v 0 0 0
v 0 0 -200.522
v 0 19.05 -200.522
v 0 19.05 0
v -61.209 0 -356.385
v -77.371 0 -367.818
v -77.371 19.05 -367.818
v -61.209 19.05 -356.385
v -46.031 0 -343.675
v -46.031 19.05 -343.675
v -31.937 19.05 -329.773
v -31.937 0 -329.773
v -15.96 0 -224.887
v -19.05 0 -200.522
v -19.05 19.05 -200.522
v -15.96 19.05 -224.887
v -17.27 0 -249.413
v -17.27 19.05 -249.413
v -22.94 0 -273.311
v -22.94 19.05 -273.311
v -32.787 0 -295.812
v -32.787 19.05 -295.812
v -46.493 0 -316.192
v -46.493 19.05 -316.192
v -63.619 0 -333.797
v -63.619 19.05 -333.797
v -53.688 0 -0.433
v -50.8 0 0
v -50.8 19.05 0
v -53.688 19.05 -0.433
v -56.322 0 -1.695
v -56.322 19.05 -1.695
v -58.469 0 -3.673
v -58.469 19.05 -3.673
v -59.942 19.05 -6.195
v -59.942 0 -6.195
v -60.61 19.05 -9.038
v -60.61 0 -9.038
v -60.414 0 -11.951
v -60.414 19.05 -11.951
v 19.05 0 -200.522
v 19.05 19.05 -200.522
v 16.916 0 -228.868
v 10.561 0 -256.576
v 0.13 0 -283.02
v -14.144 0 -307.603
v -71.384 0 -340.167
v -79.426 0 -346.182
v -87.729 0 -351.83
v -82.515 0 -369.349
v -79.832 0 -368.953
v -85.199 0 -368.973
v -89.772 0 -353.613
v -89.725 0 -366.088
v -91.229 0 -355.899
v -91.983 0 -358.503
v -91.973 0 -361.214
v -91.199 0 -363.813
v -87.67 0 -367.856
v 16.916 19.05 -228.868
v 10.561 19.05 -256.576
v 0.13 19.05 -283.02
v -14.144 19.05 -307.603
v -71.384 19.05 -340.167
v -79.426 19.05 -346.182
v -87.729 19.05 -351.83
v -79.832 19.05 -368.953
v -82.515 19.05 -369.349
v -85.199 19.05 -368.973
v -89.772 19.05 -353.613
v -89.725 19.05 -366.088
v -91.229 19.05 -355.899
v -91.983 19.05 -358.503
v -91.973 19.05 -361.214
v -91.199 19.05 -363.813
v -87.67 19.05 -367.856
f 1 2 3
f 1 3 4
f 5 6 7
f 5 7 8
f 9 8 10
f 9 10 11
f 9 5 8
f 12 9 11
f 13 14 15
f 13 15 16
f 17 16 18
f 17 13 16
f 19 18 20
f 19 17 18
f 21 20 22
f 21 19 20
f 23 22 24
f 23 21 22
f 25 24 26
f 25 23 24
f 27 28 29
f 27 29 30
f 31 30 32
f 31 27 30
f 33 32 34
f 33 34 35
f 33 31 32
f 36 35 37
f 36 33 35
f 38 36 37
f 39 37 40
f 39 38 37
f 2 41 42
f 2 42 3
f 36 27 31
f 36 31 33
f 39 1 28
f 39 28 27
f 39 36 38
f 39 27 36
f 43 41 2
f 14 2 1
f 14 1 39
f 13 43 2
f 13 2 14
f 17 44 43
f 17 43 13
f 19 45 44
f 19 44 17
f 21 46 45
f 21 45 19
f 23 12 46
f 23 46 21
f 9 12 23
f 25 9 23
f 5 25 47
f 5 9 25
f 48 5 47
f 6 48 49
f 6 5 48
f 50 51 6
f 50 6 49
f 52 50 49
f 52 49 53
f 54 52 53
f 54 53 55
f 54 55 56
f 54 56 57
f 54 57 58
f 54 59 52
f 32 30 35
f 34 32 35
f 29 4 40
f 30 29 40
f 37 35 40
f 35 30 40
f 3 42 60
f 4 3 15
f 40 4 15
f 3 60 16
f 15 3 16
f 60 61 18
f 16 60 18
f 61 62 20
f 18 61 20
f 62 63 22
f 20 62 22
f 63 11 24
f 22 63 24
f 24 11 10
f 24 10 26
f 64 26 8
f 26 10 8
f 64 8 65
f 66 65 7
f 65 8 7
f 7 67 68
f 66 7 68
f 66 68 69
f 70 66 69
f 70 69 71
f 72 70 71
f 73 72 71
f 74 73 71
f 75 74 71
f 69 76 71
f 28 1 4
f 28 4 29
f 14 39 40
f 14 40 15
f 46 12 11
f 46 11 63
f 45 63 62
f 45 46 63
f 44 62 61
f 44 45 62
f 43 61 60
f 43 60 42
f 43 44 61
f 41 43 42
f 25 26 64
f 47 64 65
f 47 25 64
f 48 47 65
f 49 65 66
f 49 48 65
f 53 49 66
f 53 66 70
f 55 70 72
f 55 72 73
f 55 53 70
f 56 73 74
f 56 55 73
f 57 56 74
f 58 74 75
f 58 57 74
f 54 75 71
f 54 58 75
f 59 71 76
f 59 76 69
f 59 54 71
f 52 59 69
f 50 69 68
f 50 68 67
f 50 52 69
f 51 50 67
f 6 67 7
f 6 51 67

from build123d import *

# Parameters (mm, degrees)
BOSS_EXTRUDE1_DEPTH = 19.05


with BuildPart() as part:
    # Sketch1 → Boss-Extrude1 (new body)
    with BuildSketch(Plane(origin=(0, 0, 0), x_dir=(1, 0, 0), z_dir=(0, 1, 0))):
        with BuildLine():
            Line((0, 0), (-50.8, 0))
            ThreePointArc((-50.8, 0), (-58.469137427, 3.673291188), (-60.413921301, 11.951367819))
            Line((-60.413921301, 11.951367819), (-19.05, 200.52150033))
            ThreePointArc((-19.05, 200.52150033), (-22.940110947, 273.310750301), (-63.619044117, 333.79737916))
            ThreePointArc((-63.619044117, 333.79737916), (-75.370955214, 343.219242923), (-87.729421071, 351.830122835))
            ThreePointArc((-87.729421071, 351.830122835), (-90.543698917, 365.003242823), (-77.370578929, 367.817520668))
            ThreePointArc((-77.370578929, 367.817520668), (-53.490221725, 350.184763018), (-31.937222332, 329.772663182))
            ThreePointArc((-31.937222332, 329.772663182), (5.842491744, 269.993724887), (19.05, 200.52150033))
            Line((19.05, 200.52150033), (0, 200.52150033))
            Line((0, 200.52150033), (0, 0))
        make_face()
    extrude(amount=BOSS_EXTRUDE1_DEPTH)


solid = part.part
